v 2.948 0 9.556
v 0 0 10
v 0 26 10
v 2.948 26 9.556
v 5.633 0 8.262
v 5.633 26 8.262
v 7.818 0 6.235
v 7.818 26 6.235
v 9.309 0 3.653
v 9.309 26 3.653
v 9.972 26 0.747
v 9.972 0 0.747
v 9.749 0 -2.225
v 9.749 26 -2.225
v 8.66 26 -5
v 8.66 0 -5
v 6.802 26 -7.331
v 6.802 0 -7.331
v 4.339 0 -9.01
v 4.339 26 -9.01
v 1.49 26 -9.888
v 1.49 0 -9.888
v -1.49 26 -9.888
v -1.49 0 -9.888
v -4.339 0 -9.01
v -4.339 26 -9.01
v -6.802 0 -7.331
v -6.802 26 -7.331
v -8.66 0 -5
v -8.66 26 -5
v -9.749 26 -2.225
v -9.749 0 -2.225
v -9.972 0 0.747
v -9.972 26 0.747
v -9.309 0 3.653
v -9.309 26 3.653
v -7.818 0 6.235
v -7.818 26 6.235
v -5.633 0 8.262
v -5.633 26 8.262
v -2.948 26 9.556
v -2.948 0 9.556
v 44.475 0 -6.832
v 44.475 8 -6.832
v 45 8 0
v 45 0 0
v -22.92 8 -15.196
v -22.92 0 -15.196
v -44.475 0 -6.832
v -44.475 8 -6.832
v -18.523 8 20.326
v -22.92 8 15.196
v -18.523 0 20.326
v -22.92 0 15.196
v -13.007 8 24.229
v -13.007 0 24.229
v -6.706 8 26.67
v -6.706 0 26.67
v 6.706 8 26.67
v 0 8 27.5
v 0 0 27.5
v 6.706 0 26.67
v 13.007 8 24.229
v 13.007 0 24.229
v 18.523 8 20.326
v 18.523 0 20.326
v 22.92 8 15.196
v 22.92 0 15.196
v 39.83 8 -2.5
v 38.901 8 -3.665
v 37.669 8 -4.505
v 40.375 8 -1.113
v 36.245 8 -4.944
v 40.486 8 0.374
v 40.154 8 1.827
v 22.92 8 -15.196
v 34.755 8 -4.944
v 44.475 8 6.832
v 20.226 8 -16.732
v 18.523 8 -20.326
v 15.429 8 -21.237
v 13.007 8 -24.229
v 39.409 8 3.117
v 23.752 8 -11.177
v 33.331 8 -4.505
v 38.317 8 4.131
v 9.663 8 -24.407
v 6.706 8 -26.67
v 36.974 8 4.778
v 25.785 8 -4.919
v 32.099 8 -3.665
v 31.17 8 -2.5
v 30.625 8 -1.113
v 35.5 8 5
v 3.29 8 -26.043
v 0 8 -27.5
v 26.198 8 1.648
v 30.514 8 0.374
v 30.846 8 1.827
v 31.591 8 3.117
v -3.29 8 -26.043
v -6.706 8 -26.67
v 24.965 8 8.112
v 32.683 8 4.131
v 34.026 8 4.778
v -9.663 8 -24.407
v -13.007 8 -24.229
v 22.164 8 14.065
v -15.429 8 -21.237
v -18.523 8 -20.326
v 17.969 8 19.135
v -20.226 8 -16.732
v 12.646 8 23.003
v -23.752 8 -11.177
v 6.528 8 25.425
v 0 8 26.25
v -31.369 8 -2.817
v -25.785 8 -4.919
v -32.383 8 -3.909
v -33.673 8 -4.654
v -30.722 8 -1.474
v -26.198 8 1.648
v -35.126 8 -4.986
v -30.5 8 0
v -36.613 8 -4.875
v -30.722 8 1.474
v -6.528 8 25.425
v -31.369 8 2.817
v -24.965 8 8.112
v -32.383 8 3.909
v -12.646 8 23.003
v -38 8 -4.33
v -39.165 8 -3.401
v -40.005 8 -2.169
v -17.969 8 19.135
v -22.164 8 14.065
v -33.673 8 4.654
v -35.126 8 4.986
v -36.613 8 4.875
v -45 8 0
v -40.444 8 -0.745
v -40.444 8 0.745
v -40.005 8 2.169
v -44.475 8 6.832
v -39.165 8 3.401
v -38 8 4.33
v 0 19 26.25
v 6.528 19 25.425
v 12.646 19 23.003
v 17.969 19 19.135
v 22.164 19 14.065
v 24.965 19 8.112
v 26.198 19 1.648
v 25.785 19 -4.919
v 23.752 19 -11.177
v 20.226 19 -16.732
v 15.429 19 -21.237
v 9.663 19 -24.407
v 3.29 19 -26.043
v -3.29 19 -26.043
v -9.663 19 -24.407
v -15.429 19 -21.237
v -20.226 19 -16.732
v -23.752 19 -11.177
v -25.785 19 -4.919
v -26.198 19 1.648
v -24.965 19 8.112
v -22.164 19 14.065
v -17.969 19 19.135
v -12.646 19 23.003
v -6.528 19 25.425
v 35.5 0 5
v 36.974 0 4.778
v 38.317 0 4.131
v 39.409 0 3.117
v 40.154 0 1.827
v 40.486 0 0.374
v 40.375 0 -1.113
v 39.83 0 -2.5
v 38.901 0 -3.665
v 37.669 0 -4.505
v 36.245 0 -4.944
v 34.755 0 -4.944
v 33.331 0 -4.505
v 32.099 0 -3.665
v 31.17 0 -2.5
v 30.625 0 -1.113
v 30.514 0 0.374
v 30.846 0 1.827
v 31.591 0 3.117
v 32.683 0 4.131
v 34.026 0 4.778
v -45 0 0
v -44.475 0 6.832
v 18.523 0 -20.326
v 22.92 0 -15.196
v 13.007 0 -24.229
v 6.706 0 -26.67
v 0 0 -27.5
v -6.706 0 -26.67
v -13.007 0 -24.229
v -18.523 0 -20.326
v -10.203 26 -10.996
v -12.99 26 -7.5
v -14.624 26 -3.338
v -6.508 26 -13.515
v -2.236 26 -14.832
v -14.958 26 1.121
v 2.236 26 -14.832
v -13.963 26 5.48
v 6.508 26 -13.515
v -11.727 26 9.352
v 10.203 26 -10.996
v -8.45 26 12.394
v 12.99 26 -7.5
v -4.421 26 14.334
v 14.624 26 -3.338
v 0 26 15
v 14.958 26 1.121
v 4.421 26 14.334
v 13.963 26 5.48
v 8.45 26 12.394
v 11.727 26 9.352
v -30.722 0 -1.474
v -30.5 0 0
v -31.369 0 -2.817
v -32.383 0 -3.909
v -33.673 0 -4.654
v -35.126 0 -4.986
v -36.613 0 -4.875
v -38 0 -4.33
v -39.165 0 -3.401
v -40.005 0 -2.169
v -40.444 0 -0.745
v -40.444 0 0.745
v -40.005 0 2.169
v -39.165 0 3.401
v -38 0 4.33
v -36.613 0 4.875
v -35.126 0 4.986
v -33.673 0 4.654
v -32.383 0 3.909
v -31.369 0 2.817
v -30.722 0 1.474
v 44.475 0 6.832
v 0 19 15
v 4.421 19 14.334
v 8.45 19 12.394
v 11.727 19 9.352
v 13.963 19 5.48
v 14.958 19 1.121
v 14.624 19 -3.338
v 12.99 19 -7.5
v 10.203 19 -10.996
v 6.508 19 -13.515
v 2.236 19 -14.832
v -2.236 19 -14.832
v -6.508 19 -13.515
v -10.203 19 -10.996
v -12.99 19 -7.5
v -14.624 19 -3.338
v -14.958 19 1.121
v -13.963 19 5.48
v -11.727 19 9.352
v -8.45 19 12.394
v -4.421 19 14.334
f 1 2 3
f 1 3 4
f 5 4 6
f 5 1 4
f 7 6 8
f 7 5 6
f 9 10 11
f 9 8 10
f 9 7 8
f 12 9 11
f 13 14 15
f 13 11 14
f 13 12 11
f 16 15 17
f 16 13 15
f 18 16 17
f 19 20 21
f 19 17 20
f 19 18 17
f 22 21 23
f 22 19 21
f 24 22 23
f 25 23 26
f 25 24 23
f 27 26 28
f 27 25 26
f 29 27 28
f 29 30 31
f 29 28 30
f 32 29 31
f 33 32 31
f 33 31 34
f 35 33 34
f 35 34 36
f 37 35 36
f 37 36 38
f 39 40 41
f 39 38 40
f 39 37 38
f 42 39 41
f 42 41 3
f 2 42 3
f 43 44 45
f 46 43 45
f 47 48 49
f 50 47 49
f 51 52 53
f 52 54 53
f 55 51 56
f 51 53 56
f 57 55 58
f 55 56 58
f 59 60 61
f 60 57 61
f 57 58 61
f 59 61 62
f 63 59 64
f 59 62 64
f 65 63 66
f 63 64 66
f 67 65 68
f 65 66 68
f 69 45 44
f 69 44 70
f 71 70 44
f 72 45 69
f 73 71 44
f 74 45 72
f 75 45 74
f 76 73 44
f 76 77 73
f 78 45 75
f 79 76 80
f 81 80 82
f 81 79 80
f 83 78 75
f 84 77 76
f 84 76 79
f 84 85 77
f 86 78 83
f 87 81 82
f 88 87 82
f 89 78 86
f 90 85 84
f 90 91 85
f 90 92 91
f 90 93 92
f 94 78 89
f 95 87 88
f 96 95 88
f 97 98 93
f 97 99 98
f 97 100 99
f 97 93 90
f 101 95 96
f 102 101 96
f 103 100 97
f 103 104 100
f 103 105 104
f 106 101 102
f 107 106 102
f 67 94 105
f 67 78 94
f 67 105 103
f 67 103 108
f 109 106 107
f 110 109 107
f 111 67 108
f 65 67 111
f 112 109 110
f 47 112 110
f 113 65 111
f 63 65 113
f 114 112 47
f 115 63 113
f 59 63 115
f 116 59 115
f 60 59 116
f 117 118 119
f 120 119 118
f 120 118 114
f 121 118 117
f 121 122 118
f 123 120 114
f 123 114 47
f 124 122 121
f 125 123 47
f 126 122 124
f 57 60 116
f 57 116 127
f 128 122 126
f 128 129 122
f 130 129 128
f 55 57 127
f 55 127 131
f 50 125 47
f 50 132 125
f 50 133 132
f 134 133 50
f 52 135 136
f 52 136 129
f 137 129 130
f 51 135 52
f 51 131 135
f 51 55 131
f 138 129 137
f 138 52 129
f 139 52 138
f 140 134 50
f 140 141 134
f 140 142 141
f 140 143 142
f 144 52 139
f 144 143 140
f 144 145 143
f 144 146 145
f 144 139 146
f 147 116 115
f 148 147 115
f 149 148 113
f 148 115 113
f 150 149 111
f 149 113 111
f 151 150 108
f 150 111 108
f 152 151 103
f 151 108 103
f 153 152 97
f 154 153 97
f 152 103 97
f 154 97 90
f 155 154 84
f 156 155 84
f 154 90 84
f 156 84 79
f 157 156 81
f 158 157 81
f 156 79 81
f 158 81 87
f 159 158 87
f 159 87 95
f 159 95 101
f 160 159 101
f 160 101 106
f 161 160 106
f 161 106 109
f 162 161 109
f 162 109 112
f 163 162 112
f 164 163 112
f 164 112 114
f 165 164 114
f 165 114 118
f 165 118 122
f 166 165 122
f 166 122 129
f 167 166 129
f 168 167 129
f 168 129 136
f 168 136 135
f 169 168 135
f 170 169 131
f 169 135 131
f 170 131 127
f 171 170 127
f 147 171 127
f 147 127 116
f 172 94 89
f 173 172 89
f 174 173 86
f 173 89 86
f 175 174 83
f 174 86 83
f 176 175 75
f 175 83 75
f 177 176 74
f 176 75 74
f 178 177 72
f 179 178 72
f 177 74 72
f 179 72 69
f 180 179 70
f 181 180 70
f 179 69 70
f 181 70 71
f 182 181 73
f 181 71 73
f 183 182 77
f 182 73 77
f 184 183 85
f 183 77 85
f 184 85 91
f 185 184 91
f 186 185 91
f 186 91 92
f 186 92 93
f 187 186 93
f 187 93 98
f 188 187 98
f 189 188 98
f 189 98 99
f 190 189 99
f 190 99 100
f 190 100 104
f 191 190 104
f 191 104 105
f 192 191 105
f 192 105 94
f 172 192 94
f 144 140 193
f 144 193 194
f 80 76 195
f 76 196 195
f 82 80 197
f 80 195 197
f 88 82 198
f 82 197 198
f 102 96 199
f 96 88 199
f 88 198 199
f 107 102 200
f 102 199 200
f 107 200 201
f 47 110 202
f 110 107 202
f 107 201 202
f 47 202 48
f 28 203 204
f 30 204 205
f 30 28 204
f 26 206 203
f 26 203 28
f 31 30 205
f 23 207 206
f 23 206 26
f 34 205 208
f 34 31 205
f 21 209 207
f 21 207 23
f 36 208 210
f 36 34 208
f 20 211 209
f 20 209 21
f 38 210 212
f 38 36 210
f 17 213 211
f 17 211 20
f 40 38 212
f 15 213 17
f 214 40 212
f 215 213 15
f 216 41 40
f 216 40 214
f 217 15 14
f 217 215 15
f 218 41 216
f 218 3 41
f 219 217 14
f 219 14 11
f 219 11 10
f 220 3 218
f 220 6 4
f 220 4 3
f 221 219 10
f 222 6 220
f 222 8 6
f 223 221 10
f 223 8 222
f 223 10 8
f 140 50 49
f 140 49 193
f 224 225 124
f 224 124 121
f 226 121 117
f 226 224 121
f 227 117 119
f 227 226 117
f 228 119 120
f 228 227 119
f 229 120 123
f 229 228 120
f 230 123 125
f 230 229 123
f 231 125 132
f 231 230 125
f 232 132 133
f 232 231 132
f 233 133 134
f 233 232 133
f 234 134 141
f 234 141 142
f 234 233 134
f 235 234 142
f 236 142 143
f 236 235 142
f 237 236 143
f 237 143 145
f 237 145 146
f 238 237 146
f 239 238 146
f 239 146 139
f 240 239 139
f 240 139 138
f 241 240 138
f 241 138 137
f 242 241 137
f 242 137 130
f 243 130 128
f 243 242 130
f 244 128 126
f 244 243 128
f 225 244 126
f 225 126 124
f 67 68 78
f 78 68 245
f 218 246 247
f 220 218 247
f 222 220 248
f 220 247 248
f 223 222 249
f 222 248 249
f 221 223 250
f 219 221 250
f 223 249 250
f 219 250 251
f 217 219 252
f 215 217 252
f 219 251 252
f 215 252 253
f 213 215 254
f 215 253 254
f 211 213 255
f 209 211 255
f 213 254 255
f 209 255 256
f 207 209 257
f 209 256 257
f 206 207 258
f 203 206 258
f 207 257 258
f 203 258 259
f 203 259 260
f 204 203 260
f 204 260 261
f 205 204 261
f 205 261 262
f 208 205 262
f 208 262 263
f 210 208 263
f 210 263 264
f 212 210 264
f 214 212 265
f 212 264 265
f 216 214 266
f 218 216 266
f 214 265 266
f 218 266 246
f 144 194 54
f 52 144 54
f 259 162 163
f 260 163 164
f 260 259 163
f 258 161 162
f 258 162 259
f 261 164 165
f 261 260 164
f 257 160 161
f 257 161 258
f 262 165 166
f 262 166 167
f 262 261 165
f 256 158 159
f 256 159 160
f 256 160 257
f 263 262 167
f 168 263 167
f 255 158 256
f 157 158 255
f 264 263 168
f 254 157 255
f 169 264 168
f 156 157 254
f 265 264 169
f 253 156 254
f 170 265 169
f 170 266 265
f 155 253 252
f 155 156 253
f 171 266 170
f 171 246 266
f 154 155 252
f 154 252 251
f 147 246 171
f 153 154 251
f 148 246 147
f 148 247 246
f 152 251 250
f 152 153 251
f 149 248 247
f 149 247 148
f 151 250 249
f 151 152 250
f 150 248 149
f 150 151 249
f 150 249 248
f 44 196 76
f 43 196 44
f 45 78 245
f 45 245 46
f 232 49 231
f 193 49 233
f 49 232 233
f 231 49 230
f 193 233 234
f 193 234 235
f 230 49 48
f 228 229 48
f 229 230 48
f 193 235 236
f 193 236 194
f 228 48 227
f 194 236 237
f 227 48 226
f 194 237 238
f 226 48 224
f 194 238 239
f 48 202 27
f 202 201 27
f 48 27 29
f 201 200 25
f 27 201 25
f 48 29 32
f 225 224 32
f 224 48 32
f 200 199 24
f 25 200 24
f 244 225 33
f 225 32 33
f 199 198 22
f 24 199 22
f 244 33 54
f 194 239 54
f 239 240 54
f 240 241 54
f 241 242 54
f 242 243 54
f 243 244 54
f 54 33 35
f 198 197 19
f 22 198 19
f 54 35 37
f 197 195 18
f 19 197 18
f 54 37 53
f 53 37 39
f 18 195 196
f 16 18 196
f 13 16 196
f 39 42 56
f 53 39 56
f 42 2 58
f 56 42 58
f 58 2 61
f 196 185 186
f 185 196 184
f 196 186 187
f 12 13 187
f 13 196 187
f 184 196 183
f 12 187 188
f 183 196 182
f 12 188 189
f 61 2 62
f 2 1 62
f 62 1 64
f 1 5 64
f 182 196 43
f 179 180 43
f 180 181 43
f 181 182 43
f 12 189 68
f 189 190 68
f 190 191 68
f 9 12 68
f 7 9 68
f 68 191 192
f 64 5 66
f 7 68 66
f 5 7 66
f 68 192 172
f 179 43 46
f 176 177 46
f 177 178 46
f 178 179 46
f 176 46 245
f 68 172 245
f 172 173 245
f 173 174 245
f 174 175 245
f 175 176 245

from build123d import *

# Parameters (mm, degrees)
SKETCH1_R               = 27.5
BOSS_EXTRUDE1_DEPTH     = 8
SKETCH2_R               = 26.25
BOSS_EXTRUDE2_DEPTH     = 11
BOSS_EXTRUDE3_DEPTH     = 8
SKETCH4_R               = 5
CUT_EXTRUDE1_DEPTH      = 54.872534746
MIRROR2_OUTLINE_R       = 5
MIRROR2_DEPTH           = 8
SKETCH6_R               = 15
BOSS_EXTRUDE4_DEPTH     = 7
CUT_EXTRUDE2_DEPTH      = 57.055775795
CUT_EXTRUDE2_DEPTH_BACK = 57.055775795
SKETCH5_R               = 10


# Read off the part's stored shape, not the designer's step: Mirror2
with BuildPart() as part:
    # Sketch1 → Boss-Extrude1 (new body)
    with BuildSketch(Plane(origin=(0, 0, 0), x_dir=(1, 0, 0), z_dir=(0, 1, 0))):
        with Locations(Location((0, 0, 0), (0, 0, 270))):
            Circle(SKETCH1_R)
    extrude(amount=BOSS_EXTRUDE1_DEPTH)

    # Sketch2 → Boss-Extrude2 (add)
    with BuildSketch(Plane(origin=(0, 8, 0), x_dir=(1, 0, 0), z_dir=(0, 1, 0))):
        with Locations(Location((0, 0, 0), (0, 0, 270))):
            Circle(SKETCH2_R)
    extrude(amount=BOSS_EXTRUDE2_DEPTH)

    # Sketch3 → Boss-Extrude3 (add)
    with BuildSketch(Plane(origin=(0, 0, 0), x_dir=(1, 0, 0), z_dir=(0, 1, 0))):
        Polygon((20.794342335, 16.0205439), (44.474731406, 6.832149094), (45, 0), (20.794342335, 0), align=None)
    boss_extrude3 = extrude(amount=BOSS_EXTRUDE3_DEPTH)

    # Mirror1: Boss-Extrude3 across plane
    add(boss_extrude3.mirror(Plane.XY))

    # Sketch4 → Cut-Extrude1 (cut, through all)
    with BuildSketch(Plane(origin=(0, 8, 0), x_dir=(1, 0, 0), z_dir=(0, 1, 0))):
        with Locations(Location((35.5, 0, 0), (0, 0, 270))):
            Circle(SKETCH4_R)
    extrude(amount=-CUT_EXTRUDE1_DEPTH, mode=Mode.SUBTRACT)

    # Mirror2 outline → Mirror2 (add)
    with BuildSketch(Plane(origin=(0, 0, 0), x_dir=(1, 0, 0), z_dir=(0, 1, 0))):
        with BuildLine():
            ThreePointArc((-22.9203732, -15.195607667), (-27.5, 0), (-22.9203732, 15.195607667))
            Line((-22.9203732, 15.195607667), (-44.474731406, 6.832149094))
            Line((-44.474731406, 6.832149094), (-45, 0))
            Line((-45, 0), (-44.474731406, -6.832149094))
            Line((-44.474731406, -6.832149094), (-22.9203732, -15.195607667))
        make_face()
        with Locations((-35.5, 0)):
            Circle(MIRROR2_OUTLINE_R, mode=Mode.SUBTRACT)
    extrude(amount=MIRROR2_DEPTH)

    # Sketch6 → Boss-Extrude4 (add)
    with BuildSketch(Plane(origin=(0, 19, 0), x_dir=(1, 0, 0), z_dir=(0, 1, 0))):
        with Locations(Location((0, 0, 0), (0, 0, 270))):
            Circle(SKETCH6_R)
    extrude(amount=BOSS_EXTRUDE4_DEPTH)

    # Sketch5 → Cut-Extrude2 (cut, two sides: drawn at the far end of the back side and taken through both)
    with BuildSketch(Plane(origin=(0, 19, 0), x_dir=(1, 0, 0), z_dir=(0, 1, 0)).offset(-CUT_EXTRUDE2_DEPTH_BACK)):
        with Locations(Location((0, 0, 0), (0, 0, 270))):
            Circle(SKETCH5_R)
    extrude(amount=CUT_EXTRUDE2_DEPTH + CUT_EXTRUDE2_DEPTH_BACK, mode=Mode.SUBTRACT)


solid = part.part
